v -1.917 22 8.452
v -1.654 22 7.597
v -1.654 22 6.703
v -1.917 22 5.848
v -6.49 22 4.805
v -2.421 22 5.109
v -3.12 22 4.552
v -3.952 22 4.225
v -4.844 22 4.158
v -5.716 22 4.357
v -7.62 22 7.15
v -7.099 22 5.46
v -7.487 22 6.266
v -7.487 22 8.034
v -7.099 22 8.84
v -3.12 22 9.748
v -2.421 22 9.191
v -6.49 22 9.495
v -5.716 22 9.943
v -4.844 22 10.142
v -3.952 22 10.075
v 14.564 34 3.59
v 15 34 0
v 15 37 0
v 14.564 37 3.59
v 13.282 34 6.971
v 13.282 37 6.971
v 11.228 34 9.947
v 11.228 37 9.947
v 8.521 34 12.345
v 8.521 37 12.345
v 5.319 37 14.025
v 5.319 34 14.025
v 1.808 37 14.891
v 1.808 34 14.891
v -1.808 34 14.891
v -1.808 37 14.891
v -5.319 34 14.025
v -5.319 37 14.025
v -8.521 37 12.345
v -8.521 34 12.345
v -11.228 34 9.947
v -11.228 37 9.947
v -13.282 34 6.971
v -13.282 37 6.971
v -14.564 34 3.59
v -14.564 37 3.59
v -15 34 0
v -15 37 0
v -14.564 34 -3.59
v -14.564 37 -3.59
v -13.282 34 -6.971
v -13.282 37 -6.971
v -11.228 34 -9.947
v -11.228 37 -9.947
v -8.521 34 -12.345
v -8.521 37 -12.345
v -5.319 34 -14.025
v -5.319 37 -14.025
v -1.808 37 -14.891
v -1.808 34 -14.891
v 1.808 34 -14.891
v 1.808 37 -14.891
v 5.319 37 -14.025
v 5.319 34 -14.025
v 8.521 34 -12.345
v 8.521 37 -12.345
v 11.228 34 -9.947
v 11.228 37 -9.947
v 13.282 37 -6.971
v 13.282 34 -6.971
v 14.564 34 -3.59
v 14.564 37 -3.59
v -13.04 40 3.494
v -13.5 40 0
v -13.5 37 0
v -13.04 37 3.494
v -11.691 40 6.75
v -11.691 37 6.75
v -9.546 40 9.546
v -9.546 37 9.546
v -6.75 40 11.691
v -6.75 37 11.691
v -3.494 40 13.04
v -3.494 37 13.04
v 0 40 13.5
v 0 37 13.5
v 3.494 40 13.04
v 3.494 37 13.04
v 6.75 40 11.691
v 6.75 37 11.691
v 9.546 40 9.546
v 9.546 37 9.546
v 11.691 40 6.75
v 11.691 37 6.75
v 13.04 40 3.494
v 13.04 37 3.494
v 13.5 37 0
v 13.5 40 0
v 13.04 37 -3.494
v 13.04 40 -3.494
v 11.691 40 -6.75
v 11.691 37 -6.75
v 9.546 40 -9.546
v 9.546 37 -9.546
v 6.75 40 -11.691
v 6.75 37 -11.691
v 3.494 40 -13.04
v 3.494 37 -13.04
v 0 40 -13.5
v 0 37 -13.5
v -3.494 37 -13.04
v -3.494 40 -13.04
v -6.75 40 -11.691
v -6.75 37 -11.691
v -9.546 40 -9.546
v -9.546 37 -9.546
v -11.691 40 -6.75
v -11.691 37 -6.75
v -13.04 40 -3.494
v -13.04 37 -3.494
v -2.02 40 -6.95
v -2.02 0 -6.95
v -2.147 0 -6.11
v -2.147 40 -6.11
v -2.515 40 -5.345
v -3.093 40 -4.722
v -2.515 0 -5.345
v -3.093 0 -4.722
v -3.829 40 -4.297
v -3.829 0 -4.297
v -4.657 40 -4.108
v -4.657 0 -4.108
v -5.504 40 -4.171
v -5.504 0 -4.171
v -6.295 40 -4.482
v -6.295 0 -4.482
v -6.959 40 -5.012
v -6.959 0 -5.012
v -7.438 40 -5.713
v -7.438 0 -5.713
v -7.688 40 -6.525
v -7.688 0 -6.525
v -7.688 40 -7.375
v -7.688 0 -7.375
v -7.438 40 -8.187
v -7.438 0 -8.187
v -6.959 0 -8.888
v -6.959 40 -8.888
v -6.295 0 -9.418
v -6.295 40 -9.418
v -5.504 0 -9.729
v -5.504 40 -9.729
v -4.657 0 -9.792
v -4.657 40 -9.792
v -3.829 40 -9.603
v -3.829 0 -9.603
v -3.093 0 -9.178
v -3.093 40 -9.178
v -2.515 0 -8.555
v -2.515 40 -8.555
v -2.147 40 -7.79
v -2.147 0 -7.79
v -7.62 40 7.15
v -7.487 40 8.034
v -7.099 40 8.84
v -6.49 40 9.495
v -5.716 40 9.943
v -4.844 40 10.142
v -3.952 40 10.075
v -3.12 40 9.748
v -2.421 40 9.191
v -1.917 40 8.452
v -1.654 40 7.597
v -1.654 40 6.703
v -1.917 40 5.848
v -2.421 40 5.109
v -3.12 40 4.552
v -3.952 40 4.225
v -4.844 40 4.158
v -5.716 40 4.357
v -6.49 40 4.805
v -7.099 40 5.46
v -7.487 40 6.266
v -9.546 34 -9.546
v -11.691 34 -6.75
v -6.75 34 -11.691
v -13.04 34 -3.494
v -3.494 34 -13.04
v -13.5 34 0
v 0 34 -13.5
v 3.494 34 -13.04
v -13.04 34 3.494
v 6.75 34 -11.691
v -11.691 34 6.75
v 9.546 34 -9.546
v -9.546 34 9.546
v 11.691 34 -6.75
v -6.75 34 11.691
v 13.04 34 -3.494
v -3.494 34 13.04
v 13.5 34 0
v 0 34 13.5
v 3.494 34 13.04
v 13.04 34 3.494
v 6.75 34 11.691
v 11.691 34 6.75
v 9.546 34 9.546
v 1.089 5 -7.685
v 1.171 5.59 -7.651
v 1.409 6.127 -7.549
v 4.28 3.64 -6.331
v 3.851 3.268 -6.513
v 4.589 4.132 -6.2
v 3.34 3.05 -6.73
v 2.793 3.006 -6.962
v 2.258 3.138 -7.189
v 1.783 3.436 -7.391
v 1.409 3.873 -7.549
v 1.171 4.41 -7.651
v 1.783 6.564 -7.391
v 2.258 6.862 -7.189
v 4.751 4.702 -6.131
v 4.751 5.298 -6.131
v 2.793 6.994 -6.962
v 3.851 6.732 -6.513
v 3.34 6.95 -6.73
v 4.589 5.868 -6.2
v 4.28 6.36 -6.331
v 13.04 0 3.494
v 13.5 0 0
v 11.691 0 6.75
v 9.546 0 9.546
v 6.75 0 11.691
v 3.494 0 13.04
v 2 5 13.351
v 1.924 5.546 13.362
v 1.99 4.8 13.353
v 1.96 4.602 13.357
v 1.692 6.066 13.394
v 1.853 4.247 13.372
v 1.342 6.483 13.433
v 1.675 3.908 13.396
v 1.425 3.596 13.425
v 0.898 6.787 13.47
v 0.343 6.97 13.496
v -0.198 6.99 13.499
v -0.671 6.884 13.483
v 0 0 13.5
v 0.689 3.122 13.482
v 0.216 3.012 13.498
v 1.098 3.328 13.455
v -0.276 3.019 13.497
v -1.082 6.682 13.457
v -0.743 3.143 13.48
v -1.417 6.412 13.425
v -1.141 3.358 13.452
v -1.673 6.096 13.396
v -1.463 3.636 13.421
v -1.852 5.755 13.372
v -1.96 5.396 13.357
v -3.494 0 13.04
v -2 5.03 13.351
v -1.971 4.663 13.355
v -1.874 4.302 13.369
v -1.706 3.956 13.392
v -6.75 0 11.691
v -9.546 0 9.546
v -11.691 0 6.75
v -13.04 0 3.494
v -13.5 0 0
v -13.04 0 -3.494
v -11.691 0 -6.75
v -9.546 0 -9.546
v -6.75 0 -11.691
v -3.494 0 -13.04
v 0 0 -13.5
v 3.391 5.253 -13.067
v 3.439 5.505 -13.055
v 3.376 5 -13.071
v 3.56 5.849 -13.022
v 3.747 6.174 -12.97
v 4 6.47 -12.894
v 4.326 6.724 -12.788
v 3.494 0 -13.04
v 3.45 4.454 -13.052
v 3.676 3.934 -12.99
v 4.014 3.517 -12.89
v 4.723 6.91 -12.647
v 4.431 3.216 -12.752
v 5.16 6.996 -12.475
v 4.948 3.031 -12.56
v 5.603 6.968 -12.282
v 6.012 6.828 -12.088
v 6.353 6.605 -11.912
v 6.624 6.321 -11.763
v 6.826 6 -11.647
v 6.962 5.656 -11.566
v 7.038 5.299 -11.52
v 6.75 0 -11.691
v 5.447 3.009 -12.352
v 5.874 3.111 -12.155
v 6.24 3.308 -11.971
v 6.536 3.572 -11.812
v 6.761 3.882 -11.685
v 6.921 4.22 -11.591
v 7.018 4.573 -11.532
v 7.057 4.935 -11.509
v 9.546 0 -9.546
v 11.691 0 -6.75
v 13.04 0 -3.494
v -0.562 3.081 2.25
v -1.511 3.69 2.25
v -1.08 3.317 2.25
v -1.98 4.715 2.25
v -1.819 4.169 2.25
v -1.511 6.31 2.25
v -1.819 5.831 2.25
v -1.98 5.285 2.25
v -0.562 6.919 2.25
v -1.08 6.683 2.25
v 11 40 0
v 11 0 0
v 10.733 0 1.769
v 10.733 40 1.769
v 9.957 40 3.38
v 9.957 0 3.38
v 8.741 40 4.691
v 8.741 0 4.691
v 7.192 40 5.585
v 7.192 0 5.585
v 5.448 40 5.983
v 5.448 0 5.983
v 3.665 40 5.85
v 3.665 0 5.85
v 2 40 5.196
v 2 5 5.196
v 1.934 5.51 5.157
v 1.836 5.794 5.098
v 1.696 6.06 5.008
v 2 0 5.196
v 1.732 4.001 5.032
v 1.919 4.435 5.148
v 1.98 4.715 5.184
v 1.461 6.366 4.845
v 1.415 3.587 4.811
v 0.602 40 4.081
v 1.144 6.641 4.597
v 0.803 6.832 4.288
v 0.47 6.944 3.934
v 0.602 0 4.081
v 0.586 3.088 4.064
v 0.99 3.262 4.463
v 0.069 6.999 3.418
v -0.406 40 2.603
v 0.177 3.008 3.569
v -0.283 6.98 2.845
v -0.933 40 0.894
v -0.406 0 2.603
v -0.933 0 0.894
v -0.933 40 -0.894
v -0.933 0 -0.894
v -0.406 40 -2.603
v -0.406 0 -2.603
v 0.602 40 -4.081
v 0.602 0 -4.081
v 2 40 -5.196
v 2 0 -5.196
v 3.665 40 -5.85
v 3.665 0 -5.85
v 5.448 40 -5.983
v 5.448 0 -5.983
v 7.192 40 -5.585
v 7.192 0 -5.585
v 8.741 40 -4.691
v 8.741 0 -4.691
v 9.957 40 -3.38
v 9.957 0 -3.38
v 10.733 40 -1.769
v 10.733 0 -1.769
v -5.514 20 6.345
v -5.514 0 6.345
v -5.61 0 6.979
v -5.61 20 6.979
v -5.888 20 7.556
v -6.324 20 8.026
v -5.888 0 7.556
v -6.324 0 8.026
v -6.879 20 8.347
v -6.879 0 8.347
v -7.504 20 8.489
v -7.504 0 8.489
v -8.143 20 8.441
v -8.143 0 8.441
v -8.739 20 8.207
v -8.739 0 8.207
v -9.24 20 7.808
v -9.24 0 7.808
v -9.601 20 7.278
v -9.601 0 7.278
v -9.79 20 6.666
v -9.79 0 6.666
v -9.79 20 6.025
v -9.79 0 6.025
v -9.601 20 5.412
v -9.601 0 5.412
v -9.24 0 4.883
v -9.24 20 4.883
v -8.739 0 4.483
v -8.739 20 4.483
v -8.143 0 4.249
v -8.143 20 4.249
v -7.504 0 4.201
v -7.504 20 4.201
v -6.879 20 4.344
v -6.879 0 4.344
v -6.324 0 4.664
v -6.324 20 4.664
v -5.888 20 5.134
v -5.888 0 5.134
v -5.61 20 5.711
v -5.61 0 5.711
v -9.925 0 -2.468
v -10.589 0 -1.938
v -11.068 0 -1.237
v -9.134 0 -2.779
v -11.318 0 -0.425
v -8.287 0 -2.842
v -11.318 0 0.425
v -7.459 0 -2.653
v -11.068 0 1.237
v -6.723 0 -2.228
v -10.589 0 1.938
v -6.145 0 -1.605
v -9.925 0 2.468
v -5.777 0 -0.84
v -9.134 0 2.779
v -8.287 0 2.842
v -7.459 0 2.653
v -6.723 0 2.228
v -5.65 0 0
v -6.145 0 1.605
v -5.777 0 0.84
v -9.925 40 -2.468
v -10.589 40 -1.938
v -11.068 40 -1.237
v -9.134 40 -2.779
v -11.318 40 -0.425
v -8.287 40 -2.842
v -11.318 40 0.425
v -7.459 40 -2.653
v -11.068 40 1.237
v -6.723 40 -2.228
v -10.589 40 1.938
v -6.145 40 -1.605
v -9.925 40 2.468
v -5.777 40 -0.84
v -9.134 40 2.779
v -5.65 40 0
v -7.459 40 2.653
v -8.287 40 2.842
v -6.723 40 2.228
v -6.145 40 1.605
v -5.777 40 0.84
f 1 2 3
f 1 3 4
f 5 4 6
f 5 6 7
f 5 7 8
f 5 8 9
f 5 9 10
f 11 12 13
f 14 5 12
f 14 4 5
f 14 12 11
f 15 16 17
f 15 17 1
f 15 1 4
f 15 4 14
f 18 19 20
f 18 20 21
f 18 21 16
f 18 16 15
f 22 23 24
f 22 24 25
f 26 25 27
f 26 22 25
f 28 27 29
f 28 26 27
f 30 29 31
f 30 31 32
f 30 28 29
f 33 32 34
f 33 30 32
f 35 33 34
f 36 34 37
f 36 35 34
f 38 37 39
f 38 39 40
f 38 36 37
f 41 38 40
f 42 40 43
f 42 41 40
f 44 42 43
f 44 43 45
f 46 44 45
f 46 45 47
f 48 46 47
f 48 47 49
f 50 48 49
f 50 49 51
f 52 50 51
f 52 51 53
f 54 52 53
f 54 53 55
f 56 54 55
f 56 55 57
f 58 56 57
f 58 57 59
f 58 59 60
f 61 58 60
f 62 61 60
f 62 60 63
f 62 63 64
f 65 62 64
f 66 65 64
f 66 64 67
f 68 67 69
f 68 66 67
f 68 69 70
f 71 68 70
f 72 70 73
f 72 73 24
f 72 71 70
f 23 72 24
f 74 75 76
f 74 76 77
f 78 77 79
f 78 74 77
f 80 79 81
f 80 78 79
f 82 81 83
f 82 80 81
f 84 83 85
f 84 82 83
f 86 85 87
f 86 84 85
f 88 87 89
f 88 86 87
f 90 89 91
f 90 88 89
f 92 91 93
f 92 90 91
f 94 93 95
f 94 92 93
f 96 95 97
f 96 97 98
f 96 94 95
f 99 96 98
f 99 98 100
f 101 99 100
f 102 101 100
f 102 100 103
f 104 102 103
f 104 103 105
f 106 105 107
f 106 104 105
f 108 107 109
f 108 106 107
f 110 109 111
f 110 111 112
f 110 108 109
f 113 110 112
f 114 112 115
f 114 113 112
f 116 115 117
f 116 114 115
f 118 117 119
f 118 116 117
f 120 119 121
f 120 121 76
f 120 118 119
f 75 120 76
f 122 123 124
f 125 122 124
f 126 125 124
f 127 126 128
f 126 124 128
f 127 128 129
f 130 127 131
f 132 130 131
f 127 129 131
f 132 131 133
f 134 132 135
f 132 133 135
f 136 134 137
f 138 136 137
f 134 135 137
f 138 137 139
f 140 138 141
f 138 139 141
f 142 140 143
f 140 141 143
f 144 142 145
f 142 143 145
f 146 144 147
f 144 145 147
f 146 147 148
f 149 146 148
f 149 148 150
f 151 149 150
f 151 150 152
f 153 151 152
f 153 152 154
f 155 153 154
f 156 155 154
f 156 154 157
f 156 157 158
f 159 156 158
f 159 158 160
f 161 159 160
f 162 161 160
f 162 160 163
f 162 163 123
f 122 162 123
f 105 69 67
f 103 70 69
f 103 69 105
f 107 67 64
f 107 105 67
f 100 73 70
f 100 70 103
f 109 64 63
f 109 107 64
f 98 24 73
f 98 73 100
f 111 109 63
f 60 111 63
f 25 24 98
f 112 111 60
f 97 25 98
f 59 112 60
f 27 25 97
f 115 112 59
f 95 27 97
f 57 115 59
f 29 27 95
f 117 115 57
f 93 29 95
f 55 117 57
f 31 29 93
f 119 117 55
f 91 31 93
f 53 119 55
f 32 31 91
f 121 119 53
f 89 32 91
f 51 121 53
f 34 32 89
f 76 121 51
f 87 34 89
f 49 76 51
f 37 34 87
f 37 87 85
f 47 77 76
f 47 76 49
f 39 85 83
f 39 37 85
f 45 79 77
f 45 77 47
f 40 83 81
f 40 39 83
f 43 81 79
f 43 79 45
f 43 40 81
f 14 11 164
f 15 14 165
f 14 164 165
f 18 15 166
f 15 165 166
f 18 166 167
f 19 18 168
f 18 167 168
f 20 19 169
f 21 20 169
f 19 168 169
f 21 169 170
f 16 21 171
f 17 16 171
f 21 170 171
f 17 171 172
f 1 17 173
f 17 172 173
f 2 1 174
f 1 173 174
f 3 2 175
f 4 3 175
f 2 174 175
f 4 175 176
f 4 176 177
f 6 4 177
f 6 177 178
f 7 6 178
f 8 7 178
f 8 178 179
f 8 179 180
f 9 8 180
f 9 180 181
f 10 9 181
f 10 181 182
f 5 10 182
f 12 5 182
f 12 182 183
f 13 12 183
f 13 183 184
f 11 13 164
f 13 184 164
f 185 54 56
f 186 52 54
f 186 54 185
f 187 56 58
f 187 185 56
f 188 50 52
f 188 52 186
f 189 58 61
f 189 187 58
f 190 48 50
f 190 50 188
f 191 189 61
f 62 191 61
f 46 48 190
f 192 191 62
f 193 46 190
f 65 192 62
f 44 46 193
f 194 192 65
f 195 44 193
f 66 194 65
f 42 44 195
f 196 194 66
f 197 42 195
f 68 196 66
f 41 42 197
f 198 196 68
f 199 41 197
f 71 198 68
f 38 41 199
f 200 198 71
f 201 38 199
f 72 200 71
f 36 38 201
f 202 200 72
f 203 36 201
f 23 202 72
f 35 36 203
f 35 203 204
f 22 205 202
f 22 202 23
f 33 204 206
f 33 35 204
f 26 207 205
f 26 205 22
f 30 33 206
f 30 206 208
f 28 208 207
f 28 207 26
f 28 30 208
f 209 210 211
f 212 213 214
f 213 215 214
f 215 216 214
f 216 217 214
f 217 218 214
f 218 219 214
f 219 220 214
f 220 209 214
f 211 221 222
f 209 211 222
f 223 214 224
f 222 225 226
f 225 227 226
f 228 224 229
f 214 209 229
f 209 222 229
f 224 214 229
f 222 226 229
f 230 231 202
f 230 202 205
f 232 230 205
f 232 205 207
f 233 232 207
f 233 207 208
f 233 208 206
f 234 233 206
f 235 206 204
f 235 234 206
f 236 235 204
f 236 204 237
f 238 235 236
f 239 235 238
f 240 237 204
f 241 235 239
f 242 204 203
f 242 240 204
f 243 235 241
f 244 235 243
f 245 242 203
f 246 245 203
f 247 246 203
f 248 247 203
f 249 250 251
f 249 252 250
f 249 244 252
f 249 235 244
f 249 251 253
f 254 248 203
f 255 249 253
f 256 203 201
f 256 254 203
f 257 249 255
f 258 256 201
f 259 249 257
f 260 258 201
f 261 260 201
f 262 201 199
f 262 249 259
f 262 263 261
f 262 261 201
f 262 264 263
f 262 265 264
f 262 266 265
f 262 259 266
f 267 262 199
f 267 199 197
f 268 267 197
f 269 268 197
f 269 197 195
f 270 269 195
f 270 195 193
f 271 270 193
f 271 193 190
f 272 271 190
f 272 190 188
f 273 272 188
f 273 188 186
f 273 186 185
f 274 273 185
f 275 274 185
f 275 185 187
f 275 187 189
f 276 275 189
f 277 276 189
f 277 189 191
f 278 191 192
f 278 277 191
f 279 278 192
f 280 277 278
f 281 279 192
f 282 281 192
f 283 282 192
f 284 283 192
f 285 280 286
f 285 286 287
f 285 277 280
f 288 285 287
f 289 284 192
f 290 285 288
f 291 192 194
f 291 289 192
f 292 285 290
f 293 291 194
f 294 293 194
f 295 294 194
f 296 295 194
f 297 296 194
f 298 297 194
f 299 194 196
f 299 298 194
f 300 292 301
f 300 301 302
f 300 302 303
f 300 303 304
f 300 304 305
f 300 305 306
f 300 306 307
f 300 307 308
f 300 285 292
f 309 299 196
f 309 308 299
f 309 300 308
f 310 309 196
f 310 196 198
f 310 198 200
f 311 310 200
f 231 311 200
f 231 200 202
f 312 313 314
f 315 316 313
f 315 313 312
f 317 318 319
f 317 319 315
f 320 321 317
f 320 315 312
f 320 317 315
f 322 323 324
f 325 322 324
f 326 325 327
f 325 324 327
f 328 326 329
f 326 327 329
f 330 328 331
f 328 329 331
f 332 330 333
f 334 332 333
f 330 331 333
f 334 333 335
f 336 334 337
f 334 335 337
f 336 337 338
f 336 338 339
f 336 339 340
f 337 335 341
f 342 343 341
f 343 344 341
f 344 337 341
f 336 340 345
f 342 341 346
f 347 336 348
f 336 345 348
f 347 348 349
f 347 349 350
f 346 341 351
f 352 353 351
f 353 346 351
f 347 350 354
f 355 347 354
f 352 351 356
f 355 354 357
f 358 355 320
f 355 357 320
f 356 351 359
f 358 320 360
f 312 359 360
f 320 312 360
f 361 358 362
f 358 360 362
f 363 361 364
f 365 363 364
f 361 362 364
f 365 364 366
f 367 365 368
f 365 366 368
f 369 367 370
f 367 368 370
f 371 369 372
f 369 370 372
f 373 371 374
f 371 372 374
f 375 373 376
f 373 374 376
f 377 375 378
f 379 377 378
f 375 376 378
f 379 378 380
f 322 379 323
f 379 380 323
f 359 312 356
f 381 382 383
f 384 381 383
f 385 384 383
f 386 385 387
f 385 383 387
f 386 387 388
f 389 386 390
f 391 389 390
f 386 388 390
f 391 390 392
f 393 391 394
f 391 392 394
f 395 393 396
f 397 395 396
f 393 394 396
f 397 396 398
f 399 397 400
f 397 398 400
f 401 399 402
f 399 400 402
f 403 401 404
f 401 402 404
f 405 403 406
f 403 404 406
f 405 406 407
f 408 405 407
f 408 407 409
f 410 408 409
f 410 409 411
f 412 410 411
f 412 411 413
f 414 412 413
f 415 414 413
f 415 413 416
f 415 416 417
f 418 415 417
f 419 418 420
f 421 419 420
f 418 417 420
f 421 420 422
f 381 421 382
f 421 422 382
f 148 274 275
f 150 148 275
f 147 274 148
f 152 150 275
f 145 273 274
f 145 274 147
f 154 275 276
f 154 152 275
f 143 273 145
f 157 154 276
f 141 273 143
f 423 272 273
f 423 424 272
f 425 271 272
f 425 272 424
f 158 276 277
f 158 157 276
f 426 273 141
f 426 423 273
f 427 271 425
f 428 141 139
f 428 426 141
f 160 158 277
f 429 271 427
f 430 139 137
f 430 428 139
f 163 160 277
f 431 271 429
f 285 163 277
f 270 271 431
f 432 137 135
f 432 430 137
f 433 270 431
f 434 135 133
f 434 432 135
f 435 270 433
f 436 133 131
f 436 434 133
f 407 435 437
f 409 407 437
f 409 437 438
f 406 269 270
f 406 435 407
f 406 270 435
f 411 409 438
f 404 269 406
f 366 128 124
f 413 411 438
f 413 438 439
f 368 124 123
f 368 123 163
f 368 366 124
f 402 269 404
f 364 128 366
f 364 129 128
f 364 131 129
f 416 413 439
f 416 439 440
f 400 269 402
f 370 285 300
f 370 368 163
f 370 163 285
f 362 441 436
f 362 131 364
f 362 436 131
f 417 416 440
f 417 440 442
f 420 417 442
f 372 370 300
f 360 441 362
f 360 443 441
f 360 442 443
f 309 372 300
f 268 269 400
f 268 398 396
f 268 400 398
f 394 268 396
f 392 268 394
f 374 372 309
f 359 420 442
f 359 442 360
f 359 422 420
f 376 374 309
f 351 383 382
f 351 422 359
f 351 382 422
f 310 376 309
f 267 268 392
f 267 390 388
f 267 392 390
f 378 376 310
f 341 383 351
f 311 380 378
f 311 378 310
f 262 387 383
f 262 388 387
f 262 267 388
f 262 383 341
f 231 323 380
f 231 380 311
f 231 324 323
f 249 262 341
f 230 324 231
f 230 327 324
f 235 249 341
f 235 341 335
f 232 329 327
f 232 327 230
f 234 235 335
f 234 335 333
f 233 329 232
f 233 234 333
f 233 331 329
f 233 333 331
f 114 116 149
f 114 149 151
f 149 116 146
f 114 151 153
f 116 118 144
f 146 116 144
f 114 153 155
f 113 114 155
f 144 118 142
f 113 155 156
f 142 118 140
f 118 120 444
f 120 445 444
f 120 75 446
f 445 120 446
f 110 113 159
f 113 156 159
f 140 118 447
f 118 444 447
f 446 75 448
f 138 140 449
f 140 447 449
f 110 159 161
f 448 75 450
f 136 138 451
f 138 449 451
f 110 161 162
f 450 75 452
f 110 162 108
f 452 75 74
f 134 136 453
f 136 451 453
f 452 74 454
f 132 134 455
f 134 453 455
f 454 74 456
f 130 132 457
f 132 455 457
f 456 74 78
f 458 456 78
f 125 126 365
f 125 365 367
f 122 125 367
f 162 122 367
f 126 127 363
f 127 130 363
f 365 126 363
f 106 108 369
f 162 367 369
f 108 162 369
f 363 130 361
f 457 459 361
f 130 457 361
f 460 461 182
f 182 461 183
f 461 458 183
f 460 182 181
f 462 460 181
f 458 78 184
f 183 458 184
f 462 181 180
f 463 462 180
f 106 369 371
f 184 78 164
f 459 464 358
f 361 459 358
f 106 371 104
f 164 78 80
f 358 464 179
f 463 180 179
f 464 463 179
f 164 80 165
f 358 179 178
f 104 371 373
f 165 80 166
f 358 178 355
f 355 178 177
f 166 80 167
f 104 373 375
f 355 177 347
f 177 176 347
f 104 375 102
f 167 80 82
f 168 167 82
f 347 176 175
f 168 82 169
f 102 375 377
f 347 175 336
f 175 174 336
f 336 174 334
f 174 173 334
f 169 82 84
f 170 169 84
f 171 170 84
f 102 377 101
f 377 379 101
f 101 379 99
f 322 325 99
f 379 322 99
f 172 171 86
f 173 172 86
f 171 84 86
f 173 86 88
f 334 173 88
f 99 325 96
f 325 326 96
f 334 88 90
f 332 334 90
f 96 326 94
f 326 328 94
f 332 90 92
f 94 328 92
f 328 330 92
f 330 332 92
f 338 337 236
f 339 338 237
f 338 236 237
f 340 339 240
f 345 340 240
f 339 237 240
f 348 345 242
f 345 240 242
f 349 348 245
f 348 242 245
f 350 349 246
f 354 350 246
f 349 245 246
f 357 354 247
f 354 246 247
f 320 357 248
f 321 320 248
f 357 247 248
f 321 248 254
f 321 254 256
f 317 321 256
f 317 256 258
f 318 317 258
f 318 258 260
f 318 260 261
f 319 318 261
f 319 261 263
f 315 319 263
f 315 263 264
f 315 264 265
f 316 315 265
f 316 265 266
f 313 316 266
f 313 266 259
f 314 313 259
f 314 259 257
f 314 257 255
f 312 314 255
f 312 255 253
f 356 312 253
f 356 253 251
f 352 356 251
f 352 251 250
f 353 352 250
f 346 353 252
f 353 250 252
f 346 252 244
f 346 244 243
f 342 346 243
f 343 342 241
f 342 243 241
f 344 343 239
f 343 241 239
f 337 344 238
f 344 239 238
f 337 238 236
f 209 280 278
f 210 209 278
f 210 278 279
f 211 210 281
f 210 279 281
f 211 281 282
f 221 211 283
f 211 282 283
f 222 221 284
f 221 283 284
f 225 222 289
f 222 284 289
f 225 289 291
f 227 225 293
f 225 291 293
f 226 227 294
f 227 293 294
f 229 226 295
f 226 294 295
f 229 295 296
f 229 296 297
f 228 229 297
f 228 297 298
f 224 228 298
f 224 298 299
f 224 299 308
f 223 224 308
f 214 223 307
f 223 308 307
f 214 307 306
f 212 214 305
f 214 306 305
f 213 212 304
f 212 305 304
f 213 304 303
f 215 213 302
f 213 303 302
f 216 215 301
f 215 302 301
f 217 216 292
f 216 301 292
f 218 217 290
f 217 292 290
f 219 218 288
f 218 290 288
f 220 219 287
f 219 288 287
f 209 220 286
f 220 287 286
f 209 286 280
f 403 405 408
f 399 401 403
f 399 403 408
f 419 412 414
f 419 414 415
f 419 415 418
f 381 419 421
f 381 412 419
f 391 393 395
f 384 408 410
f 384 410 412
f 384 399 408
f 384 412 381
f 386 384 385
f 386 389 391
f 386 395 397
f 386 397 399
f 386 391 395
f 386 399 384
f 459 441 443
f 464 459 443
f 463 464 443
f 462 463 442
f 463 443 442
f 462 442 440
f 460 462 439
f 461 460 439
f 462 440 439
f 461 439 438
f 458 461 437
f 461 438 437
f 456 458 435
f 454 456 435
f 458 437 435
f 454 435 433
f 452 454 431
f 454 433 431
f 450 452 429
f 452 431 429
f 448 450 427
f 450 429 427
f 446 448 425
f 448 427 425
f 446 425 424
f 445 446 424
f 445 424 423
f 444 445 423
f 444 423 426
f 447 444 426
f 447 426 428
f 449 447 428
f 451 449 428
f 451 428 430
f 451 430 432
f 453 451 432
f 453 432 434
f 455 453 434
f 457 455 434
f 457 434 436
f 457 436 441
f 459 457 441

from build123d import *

# Parameters (mm, degrees)
F0_R      = 15
F1_DEPTH  = 40
F2_R      = 25.4542264432
F2_R_2    = 13.5
F3_DEPTH  = 34
F4_R      = 18.7341307963
F4_R_2    = 13.5
F5_DEPTH  = 3
F6_R      = 6
F7_DEPTH  = 40.001
F8_R      = 2.85
F9_DEPTH  = 40.001
F10_R     = 2.85
F11_DEPTH = 40.001
F12_R     = 2.15
F13_DEPTH = 20
F14_R     = 3
F15_DEPTH = 18
F17_R     = 2
F18_DEPTH = 11.5


with BuildPart() as f1:
    # F0 (on Front) → F1 (new body)
    with BuildSketch(Plane.XZ):
        Circle(F0_R)
    extrude(amount=-F1_DEPTH)

    # F2 (on face) → F3 (cut)
    with BuildSketch(Plane.XZ):
        Circle(F2_R)
        Circle(F2_R_2, mode=Mode.SUBTRACT)
    extrude(amount=-F3_DEPTH, mode=Mode.SUBTRACT)

    # F4 (on face) → F5 (cut)
    with BuildSketch(Plane(origin=(0, 40, 0), x_dir=(-1, 0, 0), z_dir=(0, 1, 0))):
        Circle(F4_R)
        Circle(F4_R_2, mode=Mode.SUBTRACT)
    extrude(amount=-F5_DEPTH, mode=Mode.SUBTRACT)

    # F6 (on face) → F7 (cut, through all)
    with BuildSketch(Plane.XZ):
        with Locations((5, 0)):
            Circle(F6_R)
    extrude(amount=-F7_DEPTH, mode=Mode.SUBTRACT)

    # F8 (on face) → F9 (cut, through all)
    with BuildSketch(Plane.XZ):
        with Locations((-4.87, -6.95)):
            Circle(F8_R)
    extrude(amount=-F9_DEPTH, mode=Mode.SUBTRACT)

    # F10 (on face) → F11 (cut, through all)
    with BuildSketch(Plane.XZ):
        with Locations((-8.5, 0)):
            Circle(F10_R)
    extrude(amount=-F11_DEPTH, mode=Mode.SUBTRACT)

    # F12 (on face) → F13 (cut)
    with BuildSketch(Plane.XZ):
        with Locations((-7.6642647059, 6.3451986981)):
            Circle(F12_R)
    extrude(amount=-F13_DEPTH, mode=Mode.SUBTRACT)

    # F14 (on face) → F15 (cut)
    with BuildSketch(Plane(origin=(0, 40, 0), x_dir=(-1, 0, 0), z_dir=(0, 1, 0))):
        with Locations((4.62, 7.15)):
            Circle(F14_R)
    extrude(amount=-F15_DEPTH, mode=Mode.SUBTRACT)

    # F17 (on offset) → F18 (cut)
    with BuildSketch(Plane.XY.offset(13.75)):
        with Locations((0, 5)):
            Circle(F17_R)
    extrude(amount=-F18_DEPTH, mode=Mode.SUBTRACT)

    # F20 (on offset) → F21 (revolve, cut)
    with BuildSketch(Plane.XZ.offset(-5)):
        Polygon((5.2748702346, -12.4268155216), (2.9304834637, -6.9037864009), (1.0894737568, -7.6852486579), (3.4338605277, -13.2082777786), align=None)
    revolve(axis=Axis((2.6374351173, 5, -6.2134077608), (0.3907311285, 0, -0.9205048535)), mode=Mode.SUBTRACT)


solid = f1.part
